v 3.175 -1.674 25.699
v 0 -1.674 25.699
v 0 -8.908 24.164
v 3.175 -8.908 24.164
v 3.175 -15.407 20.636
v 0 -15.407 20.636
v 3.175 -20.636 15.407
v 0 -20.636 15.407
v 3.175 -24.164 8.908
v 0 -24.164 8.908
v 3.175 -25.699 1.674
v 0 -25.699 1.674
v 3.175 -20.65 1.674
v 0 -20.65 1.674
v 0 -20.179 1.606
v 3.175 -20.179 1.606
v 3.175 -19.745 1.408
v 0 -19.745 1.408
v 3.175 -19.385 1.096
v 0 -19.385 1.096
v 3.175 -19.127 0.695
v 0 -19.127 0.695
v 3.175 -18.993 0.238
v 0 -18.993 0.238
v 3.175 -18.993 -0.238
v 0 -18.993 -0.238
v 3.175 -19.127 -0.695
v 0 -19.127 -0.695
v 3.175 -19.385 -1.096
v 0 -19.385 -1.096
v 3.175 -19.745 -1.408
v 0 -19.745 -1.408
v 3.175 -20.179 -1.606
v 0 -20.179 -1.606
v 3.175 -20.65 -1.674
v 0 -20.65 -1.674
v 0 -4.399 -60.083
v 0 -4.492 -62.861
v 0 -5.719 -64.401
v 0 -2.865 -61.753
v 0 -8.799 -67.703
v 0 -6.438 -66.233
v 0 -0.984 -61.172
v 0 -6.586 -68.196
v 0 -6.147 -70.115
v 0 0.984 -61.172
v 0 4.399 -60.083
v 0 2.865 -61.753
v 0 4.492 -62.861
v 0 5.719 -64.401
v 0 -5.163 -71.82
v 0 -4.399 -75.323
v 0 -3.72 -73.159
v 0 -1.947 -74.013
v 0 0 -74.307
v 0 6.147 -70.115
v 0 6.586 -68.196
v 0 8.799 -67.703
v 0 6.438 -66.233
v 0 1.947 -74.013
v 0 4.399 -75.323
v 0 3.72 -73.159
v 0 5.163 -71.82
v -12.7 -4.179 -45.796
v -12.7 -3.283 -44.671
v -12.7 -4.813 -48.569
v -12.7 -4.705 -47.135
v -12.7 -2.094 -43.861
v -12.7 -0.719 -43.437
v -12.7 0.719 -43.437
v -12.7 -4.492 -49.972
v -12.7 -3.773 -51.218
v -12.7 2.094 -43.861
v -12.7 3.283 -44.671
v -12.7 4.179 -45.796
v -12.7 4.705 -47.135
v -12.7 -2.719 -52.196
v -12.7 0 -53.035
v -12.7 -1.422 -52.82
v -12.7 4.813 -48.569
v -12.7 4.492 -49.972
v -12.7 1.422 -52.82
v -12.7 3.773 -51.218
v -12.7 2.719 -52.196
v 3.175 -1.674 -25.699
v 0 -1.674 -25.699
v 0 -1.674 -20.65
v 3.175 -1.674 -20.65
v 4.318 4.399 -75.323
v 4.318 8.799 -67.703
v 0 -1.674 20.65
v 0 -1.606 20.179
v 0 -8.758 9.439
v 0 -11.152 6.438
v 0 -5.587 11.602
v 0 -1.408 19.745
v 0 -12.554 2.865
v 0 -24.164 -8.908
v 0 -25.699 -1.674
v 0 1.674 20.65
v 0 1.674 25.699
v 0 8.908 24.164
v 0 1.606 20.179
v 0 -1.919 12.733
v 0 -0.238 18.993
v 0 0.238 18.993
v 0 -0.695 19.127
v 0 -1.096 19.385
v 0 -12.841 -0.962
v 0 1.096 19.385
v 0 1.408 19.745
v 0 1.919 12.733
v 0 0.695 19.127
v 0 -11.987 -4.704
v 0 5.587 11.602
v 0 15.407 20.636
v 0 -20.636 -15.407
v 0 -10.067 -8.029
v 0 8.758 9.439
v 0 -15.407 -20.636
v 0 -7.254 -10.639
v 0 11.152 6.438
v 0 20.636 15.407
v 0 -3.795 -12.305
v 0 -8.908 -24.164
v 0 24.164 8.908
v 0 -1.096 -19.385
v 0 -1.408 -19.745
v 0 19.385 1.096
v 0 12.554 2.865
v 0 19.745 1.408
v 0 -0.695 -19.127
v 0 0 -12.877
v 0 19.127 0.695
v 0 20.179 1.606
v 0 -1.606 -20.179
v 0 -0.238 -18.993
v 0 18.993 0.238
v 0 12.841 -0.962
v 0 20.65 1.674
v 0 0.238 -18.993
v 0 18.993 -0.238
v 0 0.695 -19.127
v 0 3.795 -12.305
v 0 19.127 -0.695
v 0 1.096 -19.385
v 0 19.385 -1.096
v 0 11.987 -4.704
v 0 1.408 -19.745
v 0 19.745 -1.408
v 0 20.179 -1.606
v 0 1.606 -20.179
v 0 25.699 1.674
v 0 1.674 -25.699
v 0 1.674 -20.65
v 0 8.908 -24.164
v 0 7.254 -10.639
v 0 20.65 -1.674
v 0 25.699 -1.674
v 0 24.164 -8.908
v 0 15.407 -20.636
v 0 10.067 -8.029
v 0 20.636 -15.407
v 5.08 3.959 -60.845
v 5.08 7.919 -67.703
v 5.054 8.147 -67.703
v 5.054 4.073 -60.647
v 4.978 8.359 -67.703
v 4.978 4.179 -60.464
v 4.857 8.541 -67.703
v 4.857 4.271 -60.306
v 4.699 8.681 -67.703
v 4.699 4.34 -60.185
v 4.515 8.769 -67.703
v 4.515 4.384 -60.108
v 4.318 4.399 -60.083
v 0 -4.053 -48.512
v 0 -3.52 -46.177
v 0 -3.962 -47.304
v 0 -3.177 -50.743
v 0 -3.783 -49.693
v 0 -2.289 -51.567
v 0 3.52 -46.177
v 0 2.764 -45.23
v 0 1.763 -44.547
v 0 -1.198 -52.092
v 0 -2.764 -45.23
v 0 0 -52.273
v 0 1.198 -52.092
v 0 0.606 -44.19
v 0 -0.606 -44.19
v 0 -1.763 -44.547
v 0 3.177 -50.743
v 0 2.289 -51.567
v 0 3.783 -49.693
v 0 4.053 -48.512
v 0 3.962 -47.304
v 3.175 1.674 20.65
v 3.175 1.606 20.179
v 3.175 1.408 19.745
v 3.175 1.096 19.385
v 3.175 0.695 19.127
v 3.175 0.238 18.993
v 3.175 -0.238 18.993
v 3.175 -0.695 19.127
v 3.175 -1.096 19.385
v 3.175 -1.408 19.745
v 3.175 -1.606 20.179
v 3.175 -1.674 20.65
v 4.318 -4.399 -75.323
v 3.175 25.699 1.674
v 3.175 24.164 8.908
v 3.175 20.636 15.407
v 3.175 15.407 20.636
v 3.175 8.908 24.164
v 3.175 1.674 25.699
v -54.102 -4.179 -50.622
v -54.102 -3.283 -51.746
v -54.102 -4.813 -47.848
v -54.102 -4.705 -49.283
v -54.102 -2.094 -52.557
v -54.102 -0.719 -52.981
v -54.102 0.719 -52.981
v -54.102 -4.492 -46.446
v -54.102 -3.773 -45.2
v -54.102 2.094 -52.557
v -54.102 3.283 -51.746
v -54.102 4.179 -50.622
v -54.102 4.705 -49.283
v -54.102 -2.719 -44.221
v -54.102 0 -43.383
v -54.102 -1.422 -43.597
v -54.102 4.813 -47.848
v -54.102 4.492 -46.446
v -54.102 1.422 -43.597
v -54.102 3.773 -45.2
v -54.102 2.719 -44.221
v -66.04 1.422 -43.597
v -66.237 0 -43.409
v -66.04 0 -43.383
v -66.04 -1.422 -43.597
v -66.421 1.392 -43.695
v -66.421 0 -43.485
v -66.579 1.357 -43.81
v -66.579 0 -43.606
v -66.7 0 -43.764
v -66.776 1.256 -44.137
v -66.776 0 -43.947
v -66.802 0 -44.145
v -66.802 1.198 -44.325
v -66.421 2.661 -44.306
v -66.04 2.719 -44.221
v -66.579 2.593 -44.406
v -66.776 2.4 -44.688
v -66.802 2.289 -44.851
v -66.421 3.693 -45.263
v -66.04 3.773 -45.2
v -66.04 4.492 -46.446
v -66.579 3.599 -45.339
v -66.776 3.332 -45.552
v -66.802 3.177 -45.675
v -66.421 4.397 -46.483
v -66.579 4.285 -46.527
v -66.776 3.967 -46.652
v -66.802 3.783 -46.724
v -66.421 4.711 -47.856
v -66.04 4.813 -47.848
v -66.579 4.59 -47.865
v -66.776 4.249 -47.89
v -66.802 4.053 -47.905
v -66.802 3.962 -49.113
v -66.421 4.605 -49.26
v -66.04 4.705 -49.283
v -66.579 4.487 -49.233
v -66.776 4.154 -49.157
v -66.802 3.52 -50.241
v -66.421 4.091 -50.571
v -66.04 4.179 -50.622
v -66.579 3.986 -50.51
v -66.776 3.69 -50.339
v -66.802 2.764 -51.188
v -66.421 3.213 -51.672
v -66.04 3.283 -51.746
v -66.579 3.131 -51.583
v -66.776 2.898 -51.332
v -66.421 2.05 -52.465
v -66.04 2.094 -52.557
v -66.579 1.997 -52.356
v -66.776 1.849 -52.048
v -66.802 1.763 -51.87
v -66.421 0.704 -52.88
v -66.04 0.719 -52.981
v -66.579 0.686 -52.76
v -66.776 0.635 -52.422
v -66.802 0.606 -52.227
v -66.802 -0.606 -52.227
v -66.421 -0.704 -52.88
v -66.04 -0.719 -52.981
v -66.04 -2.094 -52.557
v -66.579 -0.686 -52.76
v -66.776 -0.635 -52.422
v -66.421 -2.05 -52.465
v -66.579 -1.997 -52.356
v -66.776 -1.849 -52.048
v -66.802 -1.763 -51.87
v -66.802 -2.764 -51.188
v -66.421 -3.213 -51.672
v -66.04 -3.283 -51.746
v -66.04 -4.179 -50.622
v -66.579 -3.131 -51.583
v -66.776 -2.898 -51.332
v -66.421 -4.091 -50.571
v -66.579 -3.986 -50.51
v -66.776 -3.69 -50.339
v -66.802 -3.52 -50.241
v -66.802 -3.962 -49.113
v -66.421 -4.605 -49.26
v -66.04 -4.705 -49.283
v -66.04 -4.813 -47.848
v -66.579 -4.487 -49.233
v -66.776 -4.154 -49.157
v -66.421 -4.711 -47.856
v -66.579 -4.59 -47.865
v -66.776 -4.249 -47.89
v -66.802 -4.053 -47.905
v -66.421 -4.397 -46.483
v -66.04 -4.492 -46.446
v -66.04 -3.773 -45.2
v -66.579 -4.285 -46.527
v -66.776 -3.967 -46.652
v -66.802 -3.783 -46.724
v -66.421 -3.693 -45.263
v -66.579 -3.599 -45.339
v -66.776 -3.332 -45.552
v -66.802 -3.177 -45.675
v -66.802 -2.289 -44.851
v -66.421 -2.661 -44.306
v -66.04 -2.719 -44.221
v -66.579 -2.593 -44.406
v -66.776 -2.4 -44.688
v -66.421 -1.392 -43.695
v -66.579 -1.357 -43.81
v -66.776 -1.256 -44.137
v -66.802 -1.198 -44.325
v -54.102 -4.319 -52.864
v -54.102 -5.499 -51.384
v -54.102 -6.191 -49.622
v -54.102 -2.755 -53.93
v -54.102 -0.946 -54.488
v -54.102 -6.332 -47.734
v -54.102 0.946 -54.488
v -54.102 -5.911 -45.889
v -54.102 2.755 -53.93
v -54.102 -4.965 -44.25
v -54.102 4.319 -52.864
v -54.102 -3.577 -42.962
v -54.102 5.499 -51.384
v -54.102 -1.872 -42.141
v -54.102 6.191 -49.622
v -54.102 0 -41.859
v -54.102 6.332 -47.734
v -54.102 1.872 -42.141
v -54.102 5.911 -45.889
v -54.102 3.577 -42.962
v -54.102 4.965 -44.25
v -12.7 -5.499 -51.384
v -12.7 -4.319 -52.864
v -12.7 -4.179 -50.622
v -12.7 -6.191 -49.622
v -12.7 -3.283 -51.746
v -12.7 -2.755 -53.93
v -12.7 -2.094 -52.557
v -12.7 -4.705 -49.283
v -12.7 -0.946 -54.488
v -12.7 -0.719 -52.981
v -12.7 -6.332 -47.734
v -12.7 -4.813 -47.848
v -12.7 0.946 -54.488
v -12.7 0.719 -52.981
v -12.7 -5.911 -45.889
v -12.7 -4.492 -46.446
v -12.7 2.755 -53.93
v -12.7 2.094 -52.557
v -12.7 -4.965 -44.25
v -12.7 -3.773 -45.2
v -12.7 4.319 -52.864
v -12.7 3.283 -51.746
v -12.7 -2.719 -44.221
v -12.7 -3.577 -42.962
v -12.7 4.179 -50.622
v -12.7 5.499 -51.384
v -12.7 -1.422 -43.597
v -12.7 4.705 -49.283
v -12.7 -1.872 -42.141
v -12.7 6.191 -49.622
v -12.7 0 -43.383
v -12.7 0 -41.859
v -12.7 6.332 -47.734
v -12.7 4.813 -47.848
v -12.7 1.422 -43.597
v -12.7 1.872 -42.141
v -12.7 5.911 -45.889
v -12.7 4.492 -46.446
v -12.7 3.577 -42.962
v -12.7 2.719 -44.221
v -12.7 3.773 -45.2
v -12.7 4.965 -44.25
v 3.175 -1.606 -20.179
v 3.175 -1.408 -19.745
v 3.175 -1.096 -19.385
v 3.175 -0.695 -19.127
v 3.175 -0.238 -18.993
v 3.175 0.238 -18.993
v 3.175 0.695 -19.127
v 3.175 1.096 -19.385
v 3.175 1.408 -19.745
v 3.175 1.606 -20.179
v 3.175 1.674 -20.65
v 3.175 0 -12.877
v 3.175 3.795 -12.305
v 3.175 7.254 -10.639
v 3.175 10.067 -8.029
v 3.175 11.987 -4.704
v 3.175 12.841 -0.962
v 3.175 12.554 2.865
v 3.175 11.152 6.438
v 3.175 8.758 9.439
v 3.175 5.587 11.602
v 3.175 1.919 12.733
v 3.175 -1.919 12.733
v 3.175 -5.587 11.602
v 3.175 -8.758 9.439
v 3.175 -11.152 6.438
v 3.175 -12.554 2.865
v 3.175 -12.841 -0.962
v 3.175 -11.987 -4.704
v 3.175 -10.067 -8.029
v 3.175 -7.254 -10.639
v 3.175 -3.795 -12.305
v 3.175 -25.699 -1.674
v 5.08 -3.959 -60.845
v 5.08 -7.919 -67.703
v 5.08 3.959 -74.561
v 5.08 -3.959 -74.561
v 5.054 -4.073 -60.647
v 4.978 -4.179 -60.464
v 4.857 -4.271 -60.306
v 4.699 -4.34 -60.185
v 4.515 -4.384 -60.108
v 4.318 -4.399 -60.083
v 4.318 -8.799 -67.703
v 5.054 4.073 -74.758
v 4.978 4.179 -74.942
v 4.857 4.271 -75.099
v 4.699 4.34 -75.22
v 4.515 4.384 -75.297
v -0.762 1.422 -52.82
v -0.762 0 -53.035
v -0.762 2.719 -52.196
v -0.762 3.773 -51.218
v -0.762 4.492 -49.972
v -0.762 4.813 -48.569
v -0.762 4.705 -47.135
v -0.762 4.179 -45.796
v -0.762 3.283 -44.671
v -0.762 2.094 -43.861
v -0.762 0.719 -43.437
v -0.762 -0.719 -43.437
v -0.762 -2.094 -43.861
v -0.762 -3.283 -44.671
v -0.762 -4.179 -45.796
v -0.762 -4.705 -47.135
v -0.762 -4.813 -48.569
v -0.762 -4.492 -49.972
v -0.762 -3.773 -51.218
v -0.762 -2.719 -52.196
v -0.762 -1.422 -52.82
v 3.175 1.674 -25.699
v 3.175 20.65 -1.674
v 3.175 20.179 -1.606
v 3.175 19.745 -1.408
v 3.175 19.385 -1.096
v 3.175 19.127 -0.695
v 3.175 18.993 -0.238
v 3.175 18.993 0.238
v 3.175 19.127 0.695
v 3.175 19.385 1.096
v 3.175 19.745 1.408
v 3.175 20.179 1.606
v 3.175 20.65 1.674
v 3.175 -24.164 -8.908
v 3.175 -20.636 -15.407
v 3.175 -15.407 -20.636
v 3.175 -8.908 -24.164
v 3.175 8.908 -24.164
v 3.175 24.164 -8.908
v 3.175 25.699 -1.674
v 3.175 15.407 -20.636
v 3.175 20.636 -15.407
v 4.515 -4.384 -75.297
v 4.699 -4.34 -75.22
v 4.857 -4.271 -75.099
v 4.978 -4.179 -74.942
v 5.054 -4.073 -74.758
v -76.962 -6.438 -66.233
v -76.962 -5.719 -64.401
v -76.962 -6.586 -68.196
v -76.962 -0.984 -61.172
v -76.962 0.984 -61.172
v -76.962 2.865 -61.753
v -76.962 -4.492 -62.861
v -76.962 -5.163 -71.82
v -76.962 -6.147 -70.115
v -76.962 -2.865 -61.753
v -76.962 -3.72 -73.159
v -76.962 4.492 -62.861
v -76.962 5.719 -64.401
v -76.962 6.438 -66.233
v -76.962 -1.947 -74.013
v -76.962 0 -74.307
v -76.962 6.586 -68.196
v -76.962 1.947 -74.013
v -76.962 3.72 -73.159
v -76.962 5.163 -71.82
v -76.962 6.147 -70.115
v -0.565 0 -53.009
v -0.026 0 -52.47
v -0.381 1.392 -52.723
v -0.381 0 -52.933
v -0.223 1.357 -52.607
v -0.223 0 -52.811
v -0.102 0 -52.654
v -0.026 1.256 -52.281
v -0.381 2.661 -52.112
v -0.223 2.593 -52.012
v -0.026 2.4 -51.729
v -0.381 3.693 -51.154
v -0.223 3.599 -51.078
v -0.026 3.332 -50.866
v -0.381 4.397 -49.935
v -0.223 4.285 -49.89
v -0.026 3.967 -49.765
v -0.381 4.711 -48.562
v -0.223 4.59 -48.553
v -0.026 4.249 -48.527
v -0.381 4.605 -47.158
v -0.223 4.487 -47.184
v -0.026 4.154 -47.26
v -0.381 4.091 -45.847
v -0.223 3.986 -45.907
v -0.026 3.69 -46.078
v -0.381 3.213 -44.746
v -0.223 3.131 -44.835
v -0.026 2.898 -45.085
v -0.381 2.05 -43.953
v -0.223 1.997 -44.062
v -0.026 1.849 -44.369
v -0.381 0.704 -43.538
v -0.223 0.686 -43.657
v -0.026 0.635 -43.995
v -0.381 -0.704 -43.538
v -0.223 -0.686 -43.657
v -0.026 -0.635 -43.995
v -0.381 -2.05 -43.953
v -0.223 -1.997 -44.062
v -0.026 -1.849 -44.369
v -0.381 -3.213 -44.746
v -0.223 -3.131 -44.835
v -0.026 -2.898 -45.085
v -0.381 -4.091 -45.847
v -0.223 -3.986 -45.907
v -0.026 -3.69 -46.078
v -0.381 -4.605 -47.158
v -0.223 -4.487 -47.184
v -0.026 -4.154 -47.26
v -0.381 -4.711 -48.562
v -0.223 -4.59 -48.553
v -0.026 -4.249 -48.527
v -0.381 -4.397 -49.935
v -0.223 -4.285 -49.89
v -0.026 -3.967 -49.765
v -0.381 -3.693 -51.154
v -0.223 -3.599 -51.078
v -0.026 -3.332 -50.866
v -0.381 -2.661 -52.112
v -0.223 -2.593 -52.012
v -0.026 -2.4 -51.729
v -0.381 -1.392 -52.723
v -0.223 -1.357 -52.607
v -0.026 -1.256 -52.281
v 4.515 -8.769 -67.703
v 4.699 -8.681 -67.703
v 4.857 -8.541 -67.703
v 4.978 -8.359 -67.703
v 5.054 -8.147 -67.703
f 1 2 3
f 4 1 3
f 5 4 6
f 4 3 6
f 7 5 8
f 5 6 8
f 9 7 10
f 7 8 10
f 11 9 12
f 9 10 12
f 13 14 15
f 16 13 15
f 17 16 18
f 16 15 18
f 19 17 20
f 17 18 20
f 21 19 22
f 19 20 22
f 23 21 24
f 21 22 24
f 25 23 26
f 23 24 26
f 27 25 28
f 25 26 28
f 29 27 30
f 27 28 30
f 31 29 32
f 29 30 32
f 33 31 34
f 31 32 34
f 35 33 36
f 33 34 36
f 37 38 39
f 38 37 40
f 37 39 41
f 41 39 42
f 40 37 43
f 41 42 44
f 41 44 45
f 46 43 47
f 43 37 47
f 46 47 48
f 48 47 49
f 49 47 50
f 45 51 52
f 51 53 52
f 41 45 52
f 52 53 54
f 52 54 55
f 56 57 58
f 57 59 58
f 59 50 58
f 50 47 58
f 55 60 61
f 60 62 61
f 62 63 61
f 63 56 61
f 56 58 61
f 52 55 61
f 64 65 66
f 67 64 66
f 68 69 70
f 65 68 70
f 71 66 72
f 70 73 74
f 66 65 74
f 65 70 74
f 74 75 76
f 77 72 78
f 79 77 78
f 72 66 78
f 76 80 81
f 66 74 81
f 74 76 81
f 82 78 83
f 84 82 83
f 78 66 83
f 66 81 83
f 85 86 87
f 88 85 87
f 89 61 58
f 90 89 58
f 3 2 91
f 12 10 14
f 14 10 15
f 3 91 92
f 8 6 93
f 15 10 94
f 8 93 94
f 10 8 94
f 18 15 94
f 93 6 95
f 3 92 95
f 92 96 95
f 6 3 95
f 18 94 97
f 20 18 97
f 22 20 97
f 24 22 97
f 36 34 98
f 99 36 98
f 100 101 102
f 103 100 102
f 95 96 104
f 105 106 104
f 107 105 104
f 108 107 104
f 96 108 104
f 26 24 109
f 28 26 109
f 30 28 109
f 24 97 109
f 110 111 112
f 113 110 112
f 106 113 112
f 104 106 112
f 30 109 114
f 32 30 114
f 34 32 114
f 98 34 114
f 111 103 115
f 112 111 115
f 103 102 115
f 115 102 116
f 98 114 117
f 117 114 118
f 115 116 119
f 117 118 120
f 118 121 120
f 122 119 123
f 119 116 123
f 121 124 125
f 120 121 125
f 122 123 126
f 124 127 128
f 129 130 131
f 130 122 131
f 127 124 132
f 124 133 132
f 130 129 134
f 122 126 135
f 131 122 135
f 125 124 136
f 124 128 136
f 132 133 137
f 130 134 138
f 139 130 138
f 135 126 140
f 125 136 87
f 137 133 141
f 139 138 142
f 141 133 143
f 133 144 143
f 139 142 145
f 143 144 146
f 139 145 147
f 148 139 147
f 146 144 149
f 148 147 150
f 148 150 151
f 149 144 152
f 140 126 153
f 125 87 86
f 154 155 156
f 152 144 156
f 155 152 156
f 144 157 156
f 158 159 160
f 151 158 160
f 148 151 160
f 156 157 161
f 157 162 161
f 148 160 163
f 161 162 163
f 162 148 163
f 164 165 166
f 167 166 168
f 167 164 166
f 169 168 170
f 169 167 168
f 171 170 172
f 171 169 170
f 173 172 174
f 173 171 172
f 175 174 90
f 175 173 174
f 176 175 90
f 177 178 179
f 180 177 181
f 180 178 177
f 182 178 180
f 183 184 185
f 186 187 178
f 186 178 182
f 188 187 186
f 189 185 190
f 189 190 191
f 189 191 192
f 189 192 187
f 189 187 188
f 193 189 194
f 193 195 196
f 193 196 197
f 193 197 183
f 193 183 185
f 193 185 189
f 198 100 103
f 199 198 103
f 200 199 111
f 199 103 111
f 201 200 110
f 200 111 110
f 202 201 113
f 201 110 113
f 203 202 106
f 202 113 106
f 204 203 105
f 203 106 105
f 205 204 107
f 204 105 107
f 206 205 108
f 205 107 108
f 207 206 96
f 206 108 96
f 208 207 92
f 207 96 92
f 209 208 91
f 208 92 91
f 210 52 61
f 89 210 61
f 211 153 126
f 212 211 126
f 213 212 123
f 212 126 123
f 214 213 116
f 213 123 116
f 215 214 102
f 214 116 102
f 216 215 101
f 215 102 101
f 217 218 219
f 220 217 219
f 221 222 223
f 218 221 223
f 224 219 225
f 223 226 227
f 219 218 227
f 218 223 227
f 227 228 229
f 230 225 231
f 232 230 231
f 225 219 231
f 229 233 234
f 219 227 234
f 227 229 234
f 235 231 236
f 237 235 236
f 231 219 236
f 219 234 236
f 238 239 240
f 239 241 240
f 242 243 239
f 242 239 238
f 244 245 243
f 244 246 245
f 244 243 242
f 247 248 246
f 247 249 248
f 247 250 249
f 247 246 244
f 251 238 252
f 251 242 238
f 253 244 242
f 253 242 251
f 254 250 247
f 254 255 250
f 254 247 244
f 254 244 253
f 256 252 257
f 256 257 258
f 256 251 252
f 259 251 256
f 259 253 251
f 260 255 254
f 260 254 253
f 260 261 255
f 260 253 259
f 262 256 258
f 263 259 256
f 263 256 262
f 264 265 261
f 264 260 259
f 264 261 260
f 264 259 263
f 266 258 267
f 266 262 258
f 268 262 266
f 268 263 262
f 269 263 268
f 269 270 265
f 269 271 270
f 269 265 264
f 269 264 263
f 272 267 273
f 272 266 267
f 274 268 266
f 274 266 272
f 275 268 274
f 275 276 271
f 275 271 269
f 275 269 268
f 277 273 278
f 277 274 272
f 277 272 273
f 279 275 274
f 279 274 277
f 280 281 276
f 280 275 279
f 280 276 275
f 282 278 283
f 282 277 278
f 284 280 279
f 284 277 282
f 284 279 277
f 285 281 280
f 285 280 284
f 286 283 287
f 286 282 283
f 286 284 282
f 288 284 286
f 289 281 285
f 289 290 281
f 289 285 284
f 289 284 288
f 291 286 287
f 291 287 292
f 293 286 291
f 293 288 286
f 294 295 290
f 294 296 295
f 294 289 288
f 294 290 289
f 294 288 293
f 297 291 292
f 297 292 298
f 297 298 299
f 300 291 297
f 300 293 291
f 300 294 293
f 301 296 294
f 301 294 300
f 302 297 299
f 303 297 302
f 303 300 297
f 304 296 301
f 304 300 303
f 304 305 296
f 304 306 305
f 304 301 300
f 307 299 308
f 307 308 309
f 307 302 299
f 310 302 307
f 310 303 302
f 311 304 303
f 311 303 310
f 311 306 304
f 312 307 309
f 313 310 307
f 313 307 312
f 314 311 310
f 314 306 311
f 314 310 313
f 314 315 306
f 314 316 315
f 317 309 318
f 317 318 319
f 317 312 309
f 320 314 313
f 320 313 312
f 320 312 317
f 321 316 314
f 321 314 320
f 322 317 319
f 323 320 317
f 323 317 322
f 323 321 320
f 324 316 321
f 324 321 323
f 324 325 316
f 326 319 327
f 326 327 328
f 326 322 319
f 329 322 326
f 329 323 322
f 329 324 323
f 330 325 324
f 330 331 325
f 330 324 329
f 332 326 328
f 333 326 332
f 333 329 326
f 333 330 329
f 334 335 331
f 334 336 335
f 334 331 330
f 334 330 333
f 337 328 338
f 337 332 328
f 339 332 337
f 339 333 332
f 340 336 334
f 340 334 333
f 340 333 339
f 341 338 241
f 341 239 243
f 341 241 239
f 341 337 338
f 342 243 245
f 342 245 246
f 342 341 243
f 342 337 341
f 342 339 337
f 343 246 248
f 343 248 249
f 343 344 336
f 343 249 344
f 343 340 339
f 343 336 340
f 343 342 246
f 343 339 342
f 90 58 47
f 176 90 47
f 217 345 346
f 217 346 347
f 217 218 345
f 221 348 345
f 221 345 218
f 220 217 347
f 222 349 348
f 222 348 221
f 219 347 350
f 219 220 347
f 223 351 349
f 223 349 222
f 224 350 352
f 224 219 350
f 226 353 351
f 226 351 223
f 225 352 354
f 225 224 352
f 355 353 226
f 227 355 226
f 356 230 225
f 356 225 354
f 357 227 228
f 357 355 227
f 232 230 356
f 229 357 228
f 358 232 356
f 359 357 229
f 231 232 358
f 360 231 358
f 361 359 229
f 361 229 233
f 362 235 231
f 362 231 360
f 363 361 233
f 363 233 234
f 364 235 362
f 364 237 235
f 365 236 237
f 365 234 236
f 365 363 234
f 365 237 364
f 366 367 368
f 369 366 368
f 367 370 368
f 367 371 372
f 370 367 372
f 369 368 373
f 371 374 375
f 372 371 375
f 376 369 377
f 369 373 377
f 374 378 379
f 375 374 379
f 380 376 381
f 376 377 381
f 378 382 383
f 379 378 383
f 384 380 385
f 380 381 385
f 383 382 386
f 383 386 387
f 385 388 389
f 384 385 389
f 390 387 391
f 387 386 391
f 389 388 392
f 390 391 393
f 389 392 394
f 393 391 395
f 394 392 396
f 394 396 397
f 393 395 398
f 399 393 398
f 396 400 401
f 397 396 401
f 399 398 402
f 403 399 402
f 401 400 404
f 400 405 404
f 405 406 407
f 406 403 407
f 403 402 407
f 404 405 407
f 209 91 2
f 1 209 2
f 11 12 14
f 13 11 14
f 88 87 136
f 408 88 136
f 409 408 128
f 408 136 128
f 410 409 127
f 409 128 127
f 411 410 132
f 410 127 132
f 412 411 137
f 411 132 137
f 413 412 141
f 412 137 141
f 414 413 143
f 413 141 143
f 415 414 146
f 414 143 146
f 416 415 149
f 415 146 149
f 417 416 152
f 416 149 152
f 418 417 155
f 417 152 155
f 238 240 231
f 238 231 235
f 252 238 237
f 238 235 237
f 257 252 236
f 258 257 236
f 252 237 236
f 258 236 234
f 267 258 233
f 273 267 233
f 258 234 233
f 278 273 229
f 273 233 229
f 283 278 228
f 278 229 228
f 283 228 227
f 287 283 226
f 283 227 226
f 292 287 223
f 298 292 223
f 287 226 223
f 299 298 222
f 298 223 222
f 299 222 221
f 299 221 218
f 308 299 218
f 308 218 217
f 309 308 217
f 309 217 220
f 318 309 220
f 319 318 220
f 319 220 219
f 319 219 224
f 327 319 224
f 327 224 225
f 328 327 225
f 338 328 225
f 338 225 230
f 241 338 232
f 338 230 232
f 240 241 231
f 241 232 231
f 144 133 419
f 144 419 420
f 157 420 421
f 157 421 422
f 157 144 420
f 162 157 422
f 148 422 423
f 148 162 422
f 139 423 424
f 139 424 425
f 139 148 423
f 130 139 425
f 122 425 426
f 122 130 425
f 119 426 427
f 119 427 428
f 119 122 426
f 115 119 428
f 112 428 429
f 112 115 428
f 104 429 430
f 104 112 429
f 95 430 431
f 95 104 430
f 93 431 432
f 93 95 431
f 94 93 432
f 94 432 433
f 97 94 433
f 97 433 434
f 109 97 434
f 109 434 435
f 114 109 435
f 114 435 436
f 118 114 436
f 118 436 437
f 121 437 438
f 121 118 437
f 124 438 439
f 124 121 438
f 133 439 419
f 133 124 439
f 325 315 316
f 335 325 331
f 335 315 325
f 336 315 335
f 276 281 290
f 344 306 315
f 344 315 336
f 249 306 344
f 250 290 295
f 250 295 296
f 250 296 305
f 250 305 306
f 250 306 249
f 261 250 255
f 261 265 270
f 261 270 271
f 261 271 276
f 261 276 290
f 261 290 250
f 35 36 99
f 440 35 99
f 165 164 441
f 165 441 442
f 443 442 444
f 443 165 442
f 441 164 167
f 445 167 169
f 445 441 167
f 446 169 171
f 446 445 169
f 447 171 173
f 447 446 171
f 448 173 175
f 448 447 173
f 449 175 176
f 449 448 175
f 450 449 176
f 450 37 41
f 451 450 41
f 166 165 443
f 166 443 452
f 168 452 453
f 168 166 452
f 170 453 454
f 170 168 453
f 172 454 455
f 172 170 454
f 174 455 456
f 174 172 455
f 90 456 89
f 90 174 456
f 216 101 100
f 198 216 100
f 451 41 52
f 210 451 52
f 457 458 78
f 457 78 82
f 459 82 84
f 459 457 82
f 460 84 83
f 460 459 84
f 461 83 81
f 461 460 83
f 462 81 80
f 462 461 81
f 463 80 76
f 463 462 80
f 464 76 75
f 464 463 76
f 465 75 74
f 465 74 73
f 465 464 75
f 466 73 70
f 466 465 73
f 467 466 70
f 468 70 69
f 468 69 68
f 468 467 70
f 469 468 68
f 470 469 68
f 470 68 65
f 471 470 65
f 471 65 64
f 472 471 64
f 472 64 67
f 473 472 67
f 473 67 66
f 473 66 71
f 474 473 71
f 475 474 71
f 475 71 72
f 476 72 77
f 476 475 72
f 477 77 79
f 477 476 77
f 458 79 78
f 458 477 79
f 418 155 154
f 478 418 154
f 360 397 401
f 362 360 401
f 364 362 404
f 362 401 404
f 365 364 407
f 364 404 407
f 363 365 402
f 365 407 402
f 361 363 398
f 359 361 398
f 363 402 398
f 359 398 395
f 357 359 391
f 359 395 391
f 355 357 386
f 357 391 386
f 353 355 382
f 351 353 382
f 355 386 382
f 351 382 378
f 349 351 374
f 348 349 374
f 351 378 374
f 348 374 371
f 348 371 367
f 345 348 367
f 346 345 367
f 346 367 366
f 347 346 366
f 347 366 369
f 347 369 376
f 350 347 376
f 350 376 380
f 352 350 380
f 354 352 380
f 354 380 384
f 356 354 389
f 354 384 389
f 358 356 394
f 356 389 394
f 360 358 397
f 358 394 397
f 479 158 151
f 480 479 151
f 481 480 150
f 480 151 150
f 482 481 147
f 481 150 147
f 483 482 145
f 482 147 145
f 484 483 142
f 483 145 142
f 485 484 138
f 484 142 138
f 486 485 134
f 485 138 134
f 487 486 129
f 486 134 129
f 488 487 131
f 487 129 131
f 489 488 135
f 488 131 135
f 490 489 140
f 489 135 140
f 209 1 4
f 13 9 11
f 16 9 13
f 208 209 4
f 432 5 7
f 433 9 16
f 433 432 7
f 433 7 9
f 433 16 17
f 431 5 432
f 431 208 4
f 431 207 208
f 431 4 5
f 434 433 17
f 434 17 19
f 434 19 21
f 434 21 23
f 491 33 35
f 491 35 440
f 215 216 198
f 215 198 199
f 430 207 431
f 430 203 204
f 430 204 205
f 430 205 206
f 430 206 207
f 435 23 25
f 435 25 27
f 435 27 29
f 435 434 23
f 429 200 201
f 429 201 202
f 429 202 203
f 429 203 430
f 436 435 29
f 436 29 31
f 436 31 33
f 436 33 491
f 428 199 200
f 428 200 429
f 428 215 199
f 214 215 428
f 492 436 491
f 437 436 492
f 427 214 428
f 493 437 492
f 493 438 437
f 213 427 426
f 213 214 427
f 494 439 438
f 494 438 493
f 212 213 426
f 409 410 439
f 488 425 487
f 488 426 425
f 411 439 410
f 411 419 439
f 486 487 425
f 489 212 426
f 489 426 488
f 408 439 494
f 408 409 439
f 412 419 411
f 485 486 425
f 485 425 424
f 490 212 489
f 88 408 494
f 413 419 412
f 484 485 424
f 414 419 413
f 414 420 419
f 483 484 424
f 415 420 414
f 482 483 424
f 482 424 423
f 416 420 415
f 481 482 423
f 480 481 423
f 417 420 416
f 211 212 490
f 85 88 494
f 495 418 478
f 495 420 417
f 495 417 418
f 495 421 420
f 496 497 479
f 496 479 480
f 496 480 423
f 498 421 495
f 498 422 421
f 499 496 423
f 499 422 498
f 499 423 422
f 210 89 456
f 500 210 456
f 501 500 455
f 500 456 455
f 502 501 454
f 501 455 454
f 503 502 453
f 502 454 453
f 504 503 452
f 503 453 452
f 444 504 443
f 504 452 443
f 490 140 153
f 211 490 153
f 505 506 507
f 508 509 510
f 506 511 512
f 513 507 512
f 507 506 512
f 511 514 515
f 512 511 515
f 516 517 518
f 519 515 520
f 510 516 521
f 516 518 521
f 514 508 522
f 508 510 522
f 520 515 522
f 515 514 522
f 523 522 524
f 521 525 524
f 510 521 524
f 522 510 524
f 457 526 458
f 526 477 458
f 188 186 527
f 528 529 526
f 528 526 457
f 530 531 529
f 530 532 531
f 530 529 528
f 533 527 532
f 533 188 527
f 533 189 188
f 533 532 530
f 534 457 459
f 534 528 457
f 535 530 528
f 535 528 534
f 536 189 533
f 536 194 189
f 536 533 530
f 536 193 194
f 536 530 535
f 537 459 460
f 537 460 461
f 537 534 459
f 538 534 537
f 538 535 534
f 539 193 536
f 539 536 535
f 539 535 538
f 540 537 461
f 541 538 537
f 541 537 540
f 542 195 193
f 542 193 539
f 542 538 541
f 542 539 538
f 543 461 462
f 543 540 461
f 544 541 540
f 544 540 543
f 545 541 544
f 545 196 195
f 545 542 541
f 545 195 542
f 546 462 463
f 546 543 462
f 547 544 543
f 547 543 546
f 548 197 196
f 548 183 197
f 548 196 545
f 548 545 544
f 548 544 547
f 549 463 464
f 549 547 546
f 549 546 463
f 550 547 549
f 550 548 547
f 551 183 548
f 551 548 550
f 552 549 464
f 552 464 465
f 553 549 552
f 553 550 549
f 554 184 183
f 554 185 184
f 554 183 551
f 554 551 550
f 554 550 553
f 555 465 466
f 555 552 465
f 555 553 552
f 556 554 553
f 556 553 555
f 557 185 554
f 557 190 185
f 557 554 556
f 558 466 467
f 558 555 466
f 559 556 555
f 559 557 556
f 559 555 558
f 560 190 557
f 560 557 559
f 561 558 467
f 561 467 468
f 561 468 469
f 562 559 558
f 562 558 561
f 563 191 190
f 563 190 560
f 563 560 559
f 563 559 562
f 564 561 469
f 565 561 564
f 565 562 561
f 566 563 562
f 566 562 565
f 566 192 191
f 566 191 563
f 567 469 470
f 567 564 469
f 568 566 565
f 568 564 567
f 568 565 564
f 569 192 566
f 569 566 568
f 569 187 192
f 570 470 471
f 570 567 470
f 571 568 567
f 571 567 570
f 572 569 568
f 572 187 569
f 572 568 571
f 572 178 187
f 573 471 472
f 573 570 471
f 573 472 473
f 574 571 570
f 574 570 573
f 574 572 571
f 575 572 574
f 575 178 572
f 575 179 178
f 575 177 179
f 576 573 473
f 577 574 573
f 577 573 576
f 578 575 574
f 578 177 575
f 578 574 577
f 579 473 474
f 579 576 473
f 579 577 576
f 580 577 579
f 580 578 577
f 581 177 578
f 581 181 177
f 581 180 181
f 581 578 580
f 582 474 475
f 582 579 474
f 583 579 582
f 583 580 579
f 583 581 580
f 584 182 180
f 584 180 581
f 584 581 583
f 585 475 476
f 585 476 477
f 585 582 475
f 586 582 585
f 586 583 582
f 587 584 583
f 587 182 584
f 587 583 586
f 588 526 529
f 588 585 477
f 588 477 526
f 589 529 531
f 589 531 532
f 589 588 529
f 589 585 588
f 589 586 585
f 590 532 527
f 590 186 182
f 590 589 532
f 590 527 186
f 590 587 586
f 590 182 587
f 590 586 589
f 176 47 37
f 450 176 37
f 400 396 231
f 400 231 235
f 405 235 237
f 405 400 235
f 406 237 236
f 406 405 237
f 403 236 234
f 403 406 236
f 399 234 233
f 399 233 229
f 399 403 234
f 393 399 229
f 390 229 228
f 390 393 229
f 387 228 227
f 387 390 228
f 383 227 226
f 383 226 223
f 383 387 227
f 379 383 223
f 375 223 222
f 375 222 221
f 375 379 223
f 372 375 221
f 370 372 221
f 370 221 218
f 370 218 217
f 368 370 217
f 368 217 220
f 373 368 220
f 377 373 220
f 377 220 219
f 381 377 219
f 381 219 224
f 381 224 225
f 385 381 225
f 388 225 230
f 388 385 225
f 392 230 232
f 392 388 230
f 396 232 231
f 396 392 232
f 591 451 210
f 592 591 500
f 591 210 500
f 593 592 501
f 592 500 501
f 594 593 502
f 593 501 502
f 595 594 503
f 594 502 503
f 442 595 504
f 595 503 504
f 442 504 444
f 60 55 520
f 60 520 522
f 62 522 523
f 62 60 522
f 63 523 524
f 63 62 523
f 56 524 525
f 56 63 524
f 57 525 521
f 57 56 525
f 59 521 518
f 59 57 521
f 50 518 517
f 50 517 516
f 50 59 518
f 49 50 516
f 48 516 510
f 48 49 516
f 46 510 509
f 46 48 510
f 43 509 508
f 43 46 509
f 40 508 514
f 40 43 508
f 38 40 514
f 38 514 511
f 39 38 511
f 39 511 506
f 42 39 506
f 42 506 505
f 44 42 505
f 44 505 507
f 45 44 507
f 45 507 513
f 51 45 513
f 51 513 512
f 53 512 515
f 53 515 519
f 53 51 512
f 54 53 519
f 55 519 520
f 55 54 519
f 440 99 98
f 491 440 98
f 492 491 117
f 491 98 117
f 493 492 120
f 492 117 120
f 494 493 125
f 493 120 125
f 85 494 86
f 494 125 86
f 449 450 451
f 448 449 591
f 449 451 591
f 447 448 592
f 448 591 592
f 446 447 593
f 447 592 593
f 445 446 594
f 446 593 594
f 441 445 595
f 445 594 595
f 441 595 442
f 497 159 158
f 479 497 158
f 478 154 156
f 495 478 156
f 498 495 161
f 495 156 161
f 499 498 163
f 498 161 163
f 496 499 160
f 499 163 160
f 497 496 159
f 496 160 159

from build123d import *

# Parameters (mm, degrees)
SKETCH2_R           = 12.876739694
BOSS_EXTRUDE1_DEPTH = 3.175
SKETCH3_R           = 4.826
BOSS_EXTRUDE2_DEPTH = 12.7
SKETCH4_R           = 6.35
SKETCH4_R_2         = 4.826
BOSS_EXTRUDE3_DEPTH = 41.402
SKETCH5_R           = 4.826
BOSS_EXTRUDE4_DEPTH = 12.7
SKETCH7_R           = 6.604
BOSS_EXTRUDE5_DEPTH = 76.962
BOSS_EXTRUDE6_DEPTH = 5.08
FILLET1_R           = 0.762
FILLET2_R           = 0.762
FILLET3_R           = 0.762


with BuildPart() as part:
    # Sketch2 → Boss-Extrude1 (new body)
    with BuildSketch(Plane(origin=(0, 0, 0), x_dir=(0, 0, -1), z_dir=(1, 0, 0))):
        with BuildLine():
            Line((20.6502, 1.67397616), (25.699017577, 1.67397616))
            ThreePointArc((25.699017577, 1.67397616), (18.210459914, 18.210459914), (1.67397616, 25.699017577))
            Line((1.67397616, 25.699017577), (1.67397616, 20.6502))
            ThreePointArc((1.67397616, 20.6502), (0, 18.97622384), (-1.67397616, 20.6502))
            Line((-1.67397616, 20.6502), (-1.67397616, 25.699017577))
            ThreePointArc((-1.67397616, 25.699017577), (-18.210459914, 18.210459914), (-25.699017577, 1.67397616))
            Line((-25.699017577, 1.67397616), (-20.6502, 1.67397616))
            ThreePointArc((-20.6502, 1.67397616), (-18.97622384, 0), (-20.6502, -1.67397616))
            Line((-20.6502, -1.67397616), (-25.699017577, -1.67397616))
            ThreePointArc((-25.699017577, -1.67397616), (-18.210459914, -18.210459914), (-1.67397616, -25.699017577))
            Line((-1.67397616, -25.699017577), (-1.67397616, -20.6502))
            ThreePointArc((-1.67397616, -20.6502), (0, -18.97622384), (1.67397616, -20.6502))
            Line((1.67397616, -20.6502), (1.67397616, -25.699017577))
            ThreePointArc((1.67397616, -25.699017577), (18.210459914, -18.210459914), (25.699017577, -1.67397616))
            Line((25.699017577, -1.67397616), (20.6502, -1.67397616))
            ThreePointArc((20.6502, -1.67397616), (18.97622384, 0), (20.6502, 1.67397616))
        make_face()
        Circle(SKETCH2_R, mode=Mode.SUBTRACT)
    extrude(amount=BOSS_EXTRUDE1_DEPTH)


with BuildPart() as body_2:
    # Sketch3 → Boss-Extrude2 (new body)
    with BuildSketch(Plane(origin=(0, 0, 0), x_dir=(0, 0, -1), z_dir=(1, 0, 0))):
        with Locations((48.208683161, 0)):
            Circle(SKETCH3_R)
    extrude(amount=-BOSS_EXTRUDE2_DEPTH)

    # Fillet1
    fillet1_edges = [body_2.edges().sort_by_distance(p)[0] for p in [
        (0, 0, -43.382683161),
    ]]
    fillet(fillet1_edges, radius=FILLET1_R)


with BuildPart() as body_3:
    # Sketch4 → Boss-Extrude3 (new body)
    with BuildSketch(Plane.ZY.offset(12.7)):
        with Locations((-48.208683161, 0)):
            Circle(SKETCH4_R)
        with Locations((-48.208683161, 0)):
            Circle(SKETCH4_R_2, mode=Mode.SUBTRACT)
    extrude(amount=BOSS_EXTRUDE3_DEPTH)


with BuildPart() as body_4:
    # Sketch5 → Boss-Extrude4 (new body)
    with BuildSketch(Plane.ZY.offset(54.102)):
        with Locations((-48.208683161, 0)):
            Circle(SKETCH5_R)
    extrude(amount=BOSS_EXTRUDE4_DEPTH)

    # Fillet2
    fillet2_edges = [body_4.edges().sort_by_distance(p)[0] for p in [
        (-66.802, 0, -53.034683161),
    ]]
    fillet(fillet2_edges, radius=FILLET2_R)


with BuildPart() as body_5:
    # Sketch7 → Boss-Extrude5 (new body)
    with BuildSketch(Plane(origin=(0, 0, 0), x_dir=(0, 0, -1), z_dir=(1, 0, 0))):
        with Locations((67.702532017, 0)):
            Circle(SKETCH7_R)
    extrude(amount=-BOSS_EXTRUDE5_DEPTH)

    # Sketch8 → Boss-Extrude6 (add)
    with BuildSketch(Plane(origin=(0, 0, 0), x_dir=(0, 0, -1), z_dir=(1, 0, 0))):
        Polygon((67.702532017, -8.798818102), (75.322532017, -4.399409051), (75.322532017, 4.399409051), (67.702532017, 8.798818102), (60.082532017, 4.399409051), (60.082532017, -4.399409051), align=None)
    extrude(amount=BOSS_EXTRUDE6_DEPTH)

    # Fillet3
    fillet3_edges = [body_5.edges().sort_by_distance(p)[0] for p in [
        (5.08, 0, -60.082532017),
        (5.08, -6.599113577, -63.892532017),
        (5.08, -6.599113577, -71.512532017),
        (5.08, 0, -75.322532017),
        (5.08, 6.599113577, -71.512532017),
        (5.08, 6.599113577, -63.892532017),
    ]]
    fillet(fillet3_edges, radius=FILLET3_R)


solid = Compound([part.part, body_2.part, body_3.part, body_4.part, body_5.part])
